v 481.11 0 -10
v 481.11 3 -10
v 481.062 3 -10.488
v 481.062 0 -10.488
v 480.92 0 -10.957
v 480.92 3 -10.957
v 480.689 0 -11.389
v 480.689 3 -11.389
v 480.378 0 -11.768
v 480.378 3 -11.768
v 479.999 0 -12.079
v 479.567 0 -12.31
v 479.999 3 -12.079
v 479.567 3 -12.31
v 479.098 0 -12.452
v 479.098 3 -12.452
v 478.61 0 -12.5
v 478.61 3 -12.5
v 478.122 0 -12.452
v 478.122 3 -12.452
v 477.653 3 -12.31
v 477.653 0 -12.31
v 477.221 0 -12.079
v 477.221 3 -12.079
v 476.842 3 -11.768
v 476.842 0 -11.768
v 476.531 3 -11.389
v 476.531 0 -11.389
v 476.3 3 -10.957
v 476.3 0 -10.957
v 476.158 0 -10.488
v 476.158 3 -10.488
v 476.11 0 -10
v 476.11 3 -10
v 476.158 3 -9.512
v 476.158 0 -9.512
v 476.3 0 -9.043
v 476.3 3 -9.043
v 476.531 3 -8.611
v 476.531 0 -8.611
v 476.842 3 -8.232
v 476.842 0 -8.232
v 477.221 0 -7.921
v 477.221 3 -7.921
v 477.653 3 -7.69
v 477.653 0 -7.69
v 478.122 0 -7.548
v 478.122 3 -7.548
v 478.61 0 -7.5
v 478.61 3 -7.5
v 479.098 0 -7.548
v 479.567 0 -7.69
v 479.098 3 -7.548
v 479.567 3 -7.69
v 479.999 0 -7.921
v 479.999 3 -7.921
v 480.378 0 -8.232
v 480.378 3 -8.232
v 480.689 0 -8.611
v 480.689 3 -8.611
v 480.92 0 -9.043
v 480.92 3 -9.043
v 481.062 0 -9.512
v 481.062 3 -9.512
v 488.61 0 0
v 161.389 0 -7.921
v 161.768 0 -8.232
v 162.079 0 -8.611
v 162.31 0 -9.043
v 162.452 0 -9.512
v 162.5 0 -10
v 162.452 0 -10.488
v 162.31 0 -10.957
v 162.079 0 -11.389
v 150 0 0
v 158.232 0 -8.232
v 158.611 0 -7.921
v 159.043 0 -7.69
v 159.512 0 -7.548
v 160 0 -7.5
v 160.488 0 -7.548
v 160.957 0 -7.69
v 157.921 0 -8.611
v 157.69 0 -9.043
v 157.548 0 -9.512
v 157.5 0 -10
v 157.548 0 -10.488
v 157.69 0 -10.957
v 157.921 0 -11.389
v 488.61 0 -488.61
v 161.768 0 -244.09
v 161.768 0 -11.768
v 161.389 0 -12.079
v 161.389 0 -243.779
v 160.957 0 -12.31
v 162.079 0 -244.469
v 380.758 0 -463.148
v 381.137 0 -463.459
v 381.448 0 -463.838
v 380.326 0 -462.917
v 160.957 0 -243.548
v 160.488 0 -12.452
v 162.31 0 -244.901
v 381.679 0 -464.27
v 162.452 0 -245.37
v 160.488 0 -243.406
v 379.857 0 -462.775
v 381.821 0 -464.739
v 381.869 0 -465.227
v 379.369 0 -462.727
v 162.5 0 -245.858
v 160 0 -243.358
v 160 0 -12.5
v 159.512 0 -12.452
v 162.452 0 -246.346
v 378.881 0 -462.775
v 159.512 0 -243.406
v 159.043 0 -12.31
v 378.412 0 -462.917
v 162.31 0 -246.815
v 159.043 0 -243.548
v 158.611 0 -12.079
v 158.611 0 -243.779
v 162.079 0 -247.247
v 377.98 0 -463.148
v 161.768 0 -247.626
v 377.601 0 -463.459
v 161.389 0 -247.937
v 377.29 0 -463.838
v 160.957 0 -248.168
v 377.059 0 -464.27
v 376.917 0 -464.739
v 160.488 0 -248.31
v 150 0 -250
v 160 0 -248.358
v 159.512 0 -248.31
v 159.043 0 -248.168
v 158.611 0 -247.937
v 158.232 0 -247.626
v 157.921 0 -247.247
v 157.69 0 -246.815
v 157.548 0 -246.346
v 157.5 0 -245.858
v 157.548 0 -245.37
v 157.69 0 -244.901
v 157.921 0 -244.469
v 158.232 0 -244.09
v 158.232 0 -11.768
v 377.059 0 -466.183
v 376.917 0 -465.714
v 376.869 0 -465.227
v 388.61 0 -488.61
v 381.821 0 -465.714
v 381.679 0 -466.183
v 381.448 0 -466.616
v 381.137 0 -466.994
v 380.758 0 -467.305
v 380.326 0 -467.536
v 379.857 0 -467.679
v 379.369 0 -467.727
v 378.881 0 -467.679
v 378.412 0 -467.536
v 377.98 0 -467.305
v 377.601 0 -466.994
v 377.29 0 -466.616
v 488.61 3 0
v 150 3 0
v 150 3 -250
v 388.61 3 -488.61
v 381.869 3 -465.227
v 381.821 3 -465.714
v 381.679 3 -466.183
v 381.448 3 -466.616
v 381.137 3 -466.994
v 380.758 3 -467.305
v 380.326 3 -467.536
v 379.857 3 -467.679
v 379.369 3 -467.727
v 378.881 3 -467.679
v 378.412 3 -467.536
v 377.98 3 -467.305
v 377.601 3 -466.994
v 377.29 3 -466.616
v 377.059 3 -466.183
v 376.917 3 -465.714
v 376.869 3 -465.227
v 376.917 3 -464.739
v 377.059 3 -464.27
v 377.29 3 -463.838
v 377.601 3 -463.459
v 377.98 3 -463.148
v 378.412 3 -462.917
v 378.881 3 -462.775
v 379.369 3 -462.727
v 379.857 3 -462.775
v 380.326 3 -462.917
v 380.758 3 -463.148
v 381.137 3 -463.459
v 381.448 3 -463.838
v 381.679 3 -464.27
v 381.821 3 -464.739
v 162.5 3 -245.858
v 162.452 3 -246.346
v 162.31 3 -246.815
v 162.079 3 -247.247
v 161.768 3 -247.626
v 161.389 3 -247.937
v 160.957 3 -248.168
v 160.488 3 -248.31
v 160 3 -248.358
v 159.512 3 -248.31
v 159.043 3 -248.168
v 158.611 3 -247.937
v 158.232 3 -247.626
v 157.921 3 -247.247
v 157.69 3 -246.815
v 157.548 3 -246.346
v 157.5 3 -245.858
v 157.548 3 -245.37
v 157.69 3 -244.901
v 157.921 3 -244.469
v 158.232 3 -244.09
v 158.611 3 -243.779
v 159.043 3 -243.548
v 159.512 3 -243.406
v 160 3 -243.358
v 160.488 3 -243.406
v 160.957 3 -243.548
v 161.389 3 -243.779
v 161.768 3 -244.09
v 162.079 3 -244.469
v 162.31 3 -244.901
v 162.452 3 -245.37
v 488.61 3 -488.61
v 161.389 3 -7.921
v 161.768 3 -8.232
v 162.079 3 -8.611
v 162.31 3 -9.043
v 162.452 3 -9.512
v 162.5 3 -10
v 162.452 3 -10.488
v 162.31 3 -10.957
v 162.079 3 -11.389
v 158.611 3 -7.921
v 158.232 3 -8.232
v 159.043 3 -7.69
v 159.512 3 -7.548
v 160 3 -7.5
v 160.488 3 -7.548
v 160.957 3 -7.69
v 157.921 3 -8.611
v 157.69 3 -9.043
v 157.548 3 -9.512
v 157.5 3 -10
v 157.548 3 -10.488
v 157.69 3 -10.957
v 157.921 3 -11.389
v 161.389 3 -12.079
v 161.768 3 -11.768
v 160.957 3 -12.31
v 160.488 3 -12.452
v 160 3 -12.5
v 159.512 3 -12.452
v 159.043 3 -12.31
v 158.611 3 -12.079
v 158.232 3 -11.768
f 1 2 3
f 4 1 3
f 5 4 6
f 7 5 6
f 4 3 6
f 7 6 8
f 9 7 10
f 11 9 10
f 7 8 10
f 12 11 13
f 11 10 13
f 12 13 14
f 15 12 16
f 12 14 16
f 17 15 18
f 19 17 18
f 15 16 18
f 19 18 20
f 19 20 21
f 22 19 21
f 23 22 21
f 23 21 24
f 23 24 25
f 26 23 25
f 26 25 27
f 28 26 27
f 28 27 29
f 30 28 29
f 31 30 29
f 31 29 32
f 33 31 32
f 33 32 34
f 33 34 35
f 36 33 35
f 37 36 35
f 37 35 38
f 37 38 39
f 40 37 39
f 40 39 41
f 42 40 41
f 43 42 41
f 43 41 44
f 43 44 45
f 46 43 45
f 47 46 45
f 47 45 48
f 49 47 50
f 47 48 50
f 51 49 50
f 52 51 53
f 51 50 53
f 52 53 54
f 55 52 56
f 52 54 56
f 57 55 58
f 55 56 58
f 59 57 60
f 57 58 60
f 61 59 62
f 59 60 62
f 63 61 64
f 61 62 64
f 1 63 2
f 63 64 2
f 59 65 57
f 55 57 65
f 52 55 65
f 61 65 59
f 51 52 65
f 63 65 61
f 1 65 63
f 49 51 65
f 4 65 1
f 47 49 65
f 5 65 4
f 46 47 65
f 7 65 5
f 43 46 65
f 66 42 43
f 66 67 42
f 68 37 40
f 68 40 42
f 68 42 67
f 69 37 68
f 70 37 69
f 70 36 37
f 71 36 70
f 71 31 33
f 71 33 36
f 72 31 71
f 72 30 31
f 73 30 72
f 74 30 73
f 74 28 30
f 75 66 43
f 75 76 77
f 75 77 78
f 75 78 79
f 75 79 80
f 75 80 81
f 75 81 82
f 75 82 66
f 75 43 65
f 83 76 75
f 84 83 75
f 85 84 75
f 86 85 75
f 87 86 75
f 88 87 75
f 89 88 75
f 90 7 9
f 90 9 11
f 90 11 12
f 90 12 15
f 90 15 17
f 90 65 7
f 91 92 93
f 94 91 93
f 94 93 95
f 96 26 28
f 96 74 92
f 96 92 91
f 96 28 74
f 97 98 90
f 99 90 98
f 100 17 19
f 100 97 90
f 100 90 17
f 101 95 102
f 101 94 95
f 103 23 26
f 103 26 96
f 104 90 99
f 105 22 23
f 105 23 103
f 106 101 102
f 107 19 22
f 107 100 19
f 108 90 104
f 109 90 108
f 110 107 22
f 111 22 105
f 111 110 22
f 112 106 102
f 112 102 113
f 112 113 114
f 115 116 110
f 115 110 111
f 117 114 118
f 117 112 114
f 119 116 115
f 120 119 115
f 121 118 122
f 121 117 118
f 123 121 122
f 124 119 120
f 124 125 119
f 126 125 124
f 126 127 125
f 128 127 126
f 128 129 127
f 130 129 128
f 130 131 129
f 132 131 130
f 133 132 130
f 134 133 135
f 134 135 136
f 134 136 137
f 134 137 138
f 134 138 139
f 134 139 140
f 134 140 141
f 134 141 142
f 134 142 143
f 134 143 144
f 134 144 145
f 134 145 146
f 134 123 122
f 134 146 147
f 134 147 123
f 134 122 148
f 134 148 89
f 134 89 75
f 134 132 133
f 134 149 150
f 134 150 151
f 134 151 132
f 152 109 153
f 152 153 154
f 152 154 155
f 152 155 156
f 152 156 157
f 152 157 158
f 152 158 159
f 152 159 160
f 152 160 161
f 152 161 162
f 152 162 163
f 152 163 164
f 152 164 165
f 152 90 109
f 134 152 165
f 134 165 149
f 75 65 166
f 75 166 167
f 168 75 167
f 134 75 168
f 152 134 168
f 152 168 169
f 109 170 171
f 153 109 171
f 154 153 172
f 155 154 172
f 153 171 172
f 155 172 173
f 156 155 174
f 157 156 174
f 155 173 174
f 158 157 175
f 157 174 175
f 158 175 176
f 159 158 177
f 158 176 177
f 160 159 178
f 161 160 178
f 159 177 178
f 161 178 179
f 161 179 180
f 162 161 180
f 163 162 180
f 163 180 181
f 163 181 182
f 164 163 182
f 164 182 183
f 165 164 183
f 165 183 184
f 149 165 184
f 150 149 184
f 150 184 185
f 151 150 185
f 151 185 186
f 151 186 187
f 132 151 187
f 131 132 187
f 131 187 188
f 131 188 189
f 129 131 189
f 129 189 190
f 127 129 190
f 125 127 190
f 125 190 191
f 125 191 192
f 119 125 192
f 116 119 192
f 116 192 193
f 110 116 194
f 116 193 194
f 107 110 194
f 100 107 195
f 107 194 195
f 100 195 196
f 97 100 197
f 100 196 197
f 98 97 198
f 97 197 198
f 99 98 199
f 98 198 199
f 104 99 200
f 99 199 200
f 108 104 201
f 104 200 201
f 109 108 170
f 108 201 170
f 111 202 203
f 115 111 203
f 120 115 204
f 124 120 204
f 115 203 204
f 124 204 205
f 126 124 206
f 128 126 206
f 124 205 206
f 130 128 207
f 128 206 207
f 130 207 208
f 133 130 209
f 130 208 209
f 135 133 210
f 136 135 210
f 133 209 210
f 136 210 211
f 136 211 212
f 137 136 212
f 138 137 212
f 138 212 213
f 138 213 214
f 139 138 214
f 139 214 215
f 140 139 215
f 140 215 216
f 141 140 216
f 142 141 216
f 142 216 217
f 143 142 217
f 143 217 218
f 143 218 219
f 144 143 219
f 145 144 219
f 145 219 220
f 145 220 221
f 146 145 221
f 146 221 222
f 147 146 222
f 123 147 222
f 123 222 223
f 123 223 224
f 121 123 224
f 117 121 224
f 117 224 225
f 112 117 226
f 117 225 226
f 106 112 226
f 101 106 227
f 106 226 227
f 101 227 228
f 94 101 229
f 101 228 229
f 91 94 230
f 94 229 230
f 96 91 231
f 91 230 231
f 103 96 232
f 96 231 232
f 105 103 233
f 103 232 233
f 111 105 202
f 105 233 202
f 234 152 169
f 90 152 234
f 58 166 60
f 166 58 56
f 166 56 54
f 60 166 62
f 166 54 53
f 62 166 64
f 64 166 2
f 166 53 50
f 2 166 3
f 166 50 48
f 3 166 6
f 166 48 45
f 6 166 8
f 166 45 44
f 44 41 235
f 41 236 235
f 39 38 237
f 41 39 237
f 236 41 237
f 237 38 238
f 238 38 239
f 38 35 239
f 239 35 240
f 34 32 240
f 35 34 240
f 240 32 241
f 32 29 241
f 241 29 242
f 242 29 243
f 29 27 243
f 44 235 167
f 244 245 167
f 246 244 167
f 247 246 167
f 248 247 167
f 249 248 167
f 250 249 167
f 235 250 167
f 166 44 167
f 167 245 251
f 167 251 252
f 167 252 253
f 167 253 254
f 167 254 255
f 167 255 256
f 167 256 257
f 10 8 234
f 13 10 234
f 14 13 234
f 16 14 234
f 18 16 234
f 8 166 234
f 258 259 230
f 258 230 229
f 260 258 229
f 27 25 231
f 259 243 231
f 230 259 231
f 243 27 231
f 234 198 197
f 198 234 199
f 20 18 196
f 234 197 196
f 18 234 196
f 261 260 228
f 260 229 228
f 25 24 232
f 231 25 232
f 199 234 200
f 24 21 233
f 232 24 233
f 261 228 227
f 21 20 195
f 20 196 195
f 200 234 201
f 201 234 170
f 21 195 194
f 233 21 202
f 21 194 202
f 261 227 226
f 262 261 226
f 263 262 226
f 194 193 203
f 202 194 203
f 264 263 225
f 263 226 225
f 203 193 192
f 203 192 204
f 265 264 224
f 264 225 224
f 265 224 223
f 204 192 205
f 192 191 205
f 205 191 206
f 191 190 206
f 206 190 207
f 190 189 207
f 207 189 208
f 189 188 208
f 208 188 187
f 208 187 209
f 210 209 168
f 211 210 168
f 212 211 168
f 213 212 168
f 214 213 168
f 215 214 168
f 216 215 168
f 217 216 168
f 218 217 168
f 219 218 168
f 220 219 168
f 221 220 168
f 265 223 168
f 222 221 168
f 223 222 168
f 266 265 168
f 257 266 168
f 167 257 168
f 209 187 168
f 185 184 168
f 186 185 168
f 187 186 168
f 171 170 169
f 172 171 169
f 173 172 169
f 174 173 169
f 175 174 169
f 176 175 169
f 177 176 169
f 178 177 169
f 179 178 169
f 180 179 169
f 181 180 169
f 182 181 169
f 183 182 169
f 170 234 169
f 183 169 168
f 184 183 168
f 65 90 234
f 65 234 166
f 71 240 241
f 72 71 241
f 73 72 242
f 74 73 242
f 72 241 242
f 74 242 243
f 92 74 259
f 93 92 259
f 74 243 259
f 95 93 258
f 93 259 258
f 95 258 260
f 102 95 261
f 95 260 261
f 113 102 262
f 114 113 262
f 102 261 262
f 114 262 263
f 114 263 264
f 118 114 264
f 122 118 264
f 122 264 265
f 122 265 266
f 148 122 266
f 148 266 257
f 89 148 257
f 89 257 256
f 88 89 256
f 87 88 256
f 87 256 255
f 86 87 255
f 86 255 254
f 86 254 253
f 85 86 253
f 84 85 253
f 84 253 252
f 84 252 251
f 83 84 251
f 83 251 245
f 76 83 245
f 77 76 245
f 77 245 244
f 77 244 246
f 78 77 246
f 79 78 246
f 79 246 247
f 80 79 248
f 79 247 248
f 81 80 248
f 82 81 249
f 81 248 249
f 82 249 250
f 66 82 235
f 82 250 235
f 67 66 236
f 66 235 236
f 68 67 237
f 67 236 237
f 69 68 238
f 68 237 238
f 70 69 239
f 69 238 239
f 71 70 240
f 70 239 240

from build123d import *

# Parameters (mm, degrees)
BOSS_EXTRUDE1_DEPTH  = 3
SKETCH3_R            = 2.5
MOUNTING_HOLES_DEPTH = 4


with BuildPart() as part:
    # Sketch2 → Boss-Extrude1 (new body)
    with BuildSketch(Plane(origin=(0, 0, 0), x_dir=(1, 0, 0), z_dir=(0, 1, 0))):
        Polygon((150, 250), (388.61, 488.61), (488.61, 488.61), (488.61, 0), (150, 0), align=None)
    extrude(amount=BOSS_EXTRUDE1_DEPTH)

    # Sketch3 → mounting-holes (cut, through all)
    with BuildSketch(Plane(origin=(0, 3, 0), x_dir=(1, 0, 0), z_dir=(0, 1, 0))):
        with Locations((160, 245.857864376)):
            Circle(SKETCH3_R)
        with Locations((160, 10)):
            Circle(SKETCH3_R)
        with Locations((478.61, 10)):
            Circle(SKETCH3_R)
        with Locations((379.368855681, 465.226720057)):
            Circle(SKETCH3_R)
    extrude(amount=-MOUNTING_HOLES_DEPTH, mode=Mode.SUBTRACT)


solid = part.part
